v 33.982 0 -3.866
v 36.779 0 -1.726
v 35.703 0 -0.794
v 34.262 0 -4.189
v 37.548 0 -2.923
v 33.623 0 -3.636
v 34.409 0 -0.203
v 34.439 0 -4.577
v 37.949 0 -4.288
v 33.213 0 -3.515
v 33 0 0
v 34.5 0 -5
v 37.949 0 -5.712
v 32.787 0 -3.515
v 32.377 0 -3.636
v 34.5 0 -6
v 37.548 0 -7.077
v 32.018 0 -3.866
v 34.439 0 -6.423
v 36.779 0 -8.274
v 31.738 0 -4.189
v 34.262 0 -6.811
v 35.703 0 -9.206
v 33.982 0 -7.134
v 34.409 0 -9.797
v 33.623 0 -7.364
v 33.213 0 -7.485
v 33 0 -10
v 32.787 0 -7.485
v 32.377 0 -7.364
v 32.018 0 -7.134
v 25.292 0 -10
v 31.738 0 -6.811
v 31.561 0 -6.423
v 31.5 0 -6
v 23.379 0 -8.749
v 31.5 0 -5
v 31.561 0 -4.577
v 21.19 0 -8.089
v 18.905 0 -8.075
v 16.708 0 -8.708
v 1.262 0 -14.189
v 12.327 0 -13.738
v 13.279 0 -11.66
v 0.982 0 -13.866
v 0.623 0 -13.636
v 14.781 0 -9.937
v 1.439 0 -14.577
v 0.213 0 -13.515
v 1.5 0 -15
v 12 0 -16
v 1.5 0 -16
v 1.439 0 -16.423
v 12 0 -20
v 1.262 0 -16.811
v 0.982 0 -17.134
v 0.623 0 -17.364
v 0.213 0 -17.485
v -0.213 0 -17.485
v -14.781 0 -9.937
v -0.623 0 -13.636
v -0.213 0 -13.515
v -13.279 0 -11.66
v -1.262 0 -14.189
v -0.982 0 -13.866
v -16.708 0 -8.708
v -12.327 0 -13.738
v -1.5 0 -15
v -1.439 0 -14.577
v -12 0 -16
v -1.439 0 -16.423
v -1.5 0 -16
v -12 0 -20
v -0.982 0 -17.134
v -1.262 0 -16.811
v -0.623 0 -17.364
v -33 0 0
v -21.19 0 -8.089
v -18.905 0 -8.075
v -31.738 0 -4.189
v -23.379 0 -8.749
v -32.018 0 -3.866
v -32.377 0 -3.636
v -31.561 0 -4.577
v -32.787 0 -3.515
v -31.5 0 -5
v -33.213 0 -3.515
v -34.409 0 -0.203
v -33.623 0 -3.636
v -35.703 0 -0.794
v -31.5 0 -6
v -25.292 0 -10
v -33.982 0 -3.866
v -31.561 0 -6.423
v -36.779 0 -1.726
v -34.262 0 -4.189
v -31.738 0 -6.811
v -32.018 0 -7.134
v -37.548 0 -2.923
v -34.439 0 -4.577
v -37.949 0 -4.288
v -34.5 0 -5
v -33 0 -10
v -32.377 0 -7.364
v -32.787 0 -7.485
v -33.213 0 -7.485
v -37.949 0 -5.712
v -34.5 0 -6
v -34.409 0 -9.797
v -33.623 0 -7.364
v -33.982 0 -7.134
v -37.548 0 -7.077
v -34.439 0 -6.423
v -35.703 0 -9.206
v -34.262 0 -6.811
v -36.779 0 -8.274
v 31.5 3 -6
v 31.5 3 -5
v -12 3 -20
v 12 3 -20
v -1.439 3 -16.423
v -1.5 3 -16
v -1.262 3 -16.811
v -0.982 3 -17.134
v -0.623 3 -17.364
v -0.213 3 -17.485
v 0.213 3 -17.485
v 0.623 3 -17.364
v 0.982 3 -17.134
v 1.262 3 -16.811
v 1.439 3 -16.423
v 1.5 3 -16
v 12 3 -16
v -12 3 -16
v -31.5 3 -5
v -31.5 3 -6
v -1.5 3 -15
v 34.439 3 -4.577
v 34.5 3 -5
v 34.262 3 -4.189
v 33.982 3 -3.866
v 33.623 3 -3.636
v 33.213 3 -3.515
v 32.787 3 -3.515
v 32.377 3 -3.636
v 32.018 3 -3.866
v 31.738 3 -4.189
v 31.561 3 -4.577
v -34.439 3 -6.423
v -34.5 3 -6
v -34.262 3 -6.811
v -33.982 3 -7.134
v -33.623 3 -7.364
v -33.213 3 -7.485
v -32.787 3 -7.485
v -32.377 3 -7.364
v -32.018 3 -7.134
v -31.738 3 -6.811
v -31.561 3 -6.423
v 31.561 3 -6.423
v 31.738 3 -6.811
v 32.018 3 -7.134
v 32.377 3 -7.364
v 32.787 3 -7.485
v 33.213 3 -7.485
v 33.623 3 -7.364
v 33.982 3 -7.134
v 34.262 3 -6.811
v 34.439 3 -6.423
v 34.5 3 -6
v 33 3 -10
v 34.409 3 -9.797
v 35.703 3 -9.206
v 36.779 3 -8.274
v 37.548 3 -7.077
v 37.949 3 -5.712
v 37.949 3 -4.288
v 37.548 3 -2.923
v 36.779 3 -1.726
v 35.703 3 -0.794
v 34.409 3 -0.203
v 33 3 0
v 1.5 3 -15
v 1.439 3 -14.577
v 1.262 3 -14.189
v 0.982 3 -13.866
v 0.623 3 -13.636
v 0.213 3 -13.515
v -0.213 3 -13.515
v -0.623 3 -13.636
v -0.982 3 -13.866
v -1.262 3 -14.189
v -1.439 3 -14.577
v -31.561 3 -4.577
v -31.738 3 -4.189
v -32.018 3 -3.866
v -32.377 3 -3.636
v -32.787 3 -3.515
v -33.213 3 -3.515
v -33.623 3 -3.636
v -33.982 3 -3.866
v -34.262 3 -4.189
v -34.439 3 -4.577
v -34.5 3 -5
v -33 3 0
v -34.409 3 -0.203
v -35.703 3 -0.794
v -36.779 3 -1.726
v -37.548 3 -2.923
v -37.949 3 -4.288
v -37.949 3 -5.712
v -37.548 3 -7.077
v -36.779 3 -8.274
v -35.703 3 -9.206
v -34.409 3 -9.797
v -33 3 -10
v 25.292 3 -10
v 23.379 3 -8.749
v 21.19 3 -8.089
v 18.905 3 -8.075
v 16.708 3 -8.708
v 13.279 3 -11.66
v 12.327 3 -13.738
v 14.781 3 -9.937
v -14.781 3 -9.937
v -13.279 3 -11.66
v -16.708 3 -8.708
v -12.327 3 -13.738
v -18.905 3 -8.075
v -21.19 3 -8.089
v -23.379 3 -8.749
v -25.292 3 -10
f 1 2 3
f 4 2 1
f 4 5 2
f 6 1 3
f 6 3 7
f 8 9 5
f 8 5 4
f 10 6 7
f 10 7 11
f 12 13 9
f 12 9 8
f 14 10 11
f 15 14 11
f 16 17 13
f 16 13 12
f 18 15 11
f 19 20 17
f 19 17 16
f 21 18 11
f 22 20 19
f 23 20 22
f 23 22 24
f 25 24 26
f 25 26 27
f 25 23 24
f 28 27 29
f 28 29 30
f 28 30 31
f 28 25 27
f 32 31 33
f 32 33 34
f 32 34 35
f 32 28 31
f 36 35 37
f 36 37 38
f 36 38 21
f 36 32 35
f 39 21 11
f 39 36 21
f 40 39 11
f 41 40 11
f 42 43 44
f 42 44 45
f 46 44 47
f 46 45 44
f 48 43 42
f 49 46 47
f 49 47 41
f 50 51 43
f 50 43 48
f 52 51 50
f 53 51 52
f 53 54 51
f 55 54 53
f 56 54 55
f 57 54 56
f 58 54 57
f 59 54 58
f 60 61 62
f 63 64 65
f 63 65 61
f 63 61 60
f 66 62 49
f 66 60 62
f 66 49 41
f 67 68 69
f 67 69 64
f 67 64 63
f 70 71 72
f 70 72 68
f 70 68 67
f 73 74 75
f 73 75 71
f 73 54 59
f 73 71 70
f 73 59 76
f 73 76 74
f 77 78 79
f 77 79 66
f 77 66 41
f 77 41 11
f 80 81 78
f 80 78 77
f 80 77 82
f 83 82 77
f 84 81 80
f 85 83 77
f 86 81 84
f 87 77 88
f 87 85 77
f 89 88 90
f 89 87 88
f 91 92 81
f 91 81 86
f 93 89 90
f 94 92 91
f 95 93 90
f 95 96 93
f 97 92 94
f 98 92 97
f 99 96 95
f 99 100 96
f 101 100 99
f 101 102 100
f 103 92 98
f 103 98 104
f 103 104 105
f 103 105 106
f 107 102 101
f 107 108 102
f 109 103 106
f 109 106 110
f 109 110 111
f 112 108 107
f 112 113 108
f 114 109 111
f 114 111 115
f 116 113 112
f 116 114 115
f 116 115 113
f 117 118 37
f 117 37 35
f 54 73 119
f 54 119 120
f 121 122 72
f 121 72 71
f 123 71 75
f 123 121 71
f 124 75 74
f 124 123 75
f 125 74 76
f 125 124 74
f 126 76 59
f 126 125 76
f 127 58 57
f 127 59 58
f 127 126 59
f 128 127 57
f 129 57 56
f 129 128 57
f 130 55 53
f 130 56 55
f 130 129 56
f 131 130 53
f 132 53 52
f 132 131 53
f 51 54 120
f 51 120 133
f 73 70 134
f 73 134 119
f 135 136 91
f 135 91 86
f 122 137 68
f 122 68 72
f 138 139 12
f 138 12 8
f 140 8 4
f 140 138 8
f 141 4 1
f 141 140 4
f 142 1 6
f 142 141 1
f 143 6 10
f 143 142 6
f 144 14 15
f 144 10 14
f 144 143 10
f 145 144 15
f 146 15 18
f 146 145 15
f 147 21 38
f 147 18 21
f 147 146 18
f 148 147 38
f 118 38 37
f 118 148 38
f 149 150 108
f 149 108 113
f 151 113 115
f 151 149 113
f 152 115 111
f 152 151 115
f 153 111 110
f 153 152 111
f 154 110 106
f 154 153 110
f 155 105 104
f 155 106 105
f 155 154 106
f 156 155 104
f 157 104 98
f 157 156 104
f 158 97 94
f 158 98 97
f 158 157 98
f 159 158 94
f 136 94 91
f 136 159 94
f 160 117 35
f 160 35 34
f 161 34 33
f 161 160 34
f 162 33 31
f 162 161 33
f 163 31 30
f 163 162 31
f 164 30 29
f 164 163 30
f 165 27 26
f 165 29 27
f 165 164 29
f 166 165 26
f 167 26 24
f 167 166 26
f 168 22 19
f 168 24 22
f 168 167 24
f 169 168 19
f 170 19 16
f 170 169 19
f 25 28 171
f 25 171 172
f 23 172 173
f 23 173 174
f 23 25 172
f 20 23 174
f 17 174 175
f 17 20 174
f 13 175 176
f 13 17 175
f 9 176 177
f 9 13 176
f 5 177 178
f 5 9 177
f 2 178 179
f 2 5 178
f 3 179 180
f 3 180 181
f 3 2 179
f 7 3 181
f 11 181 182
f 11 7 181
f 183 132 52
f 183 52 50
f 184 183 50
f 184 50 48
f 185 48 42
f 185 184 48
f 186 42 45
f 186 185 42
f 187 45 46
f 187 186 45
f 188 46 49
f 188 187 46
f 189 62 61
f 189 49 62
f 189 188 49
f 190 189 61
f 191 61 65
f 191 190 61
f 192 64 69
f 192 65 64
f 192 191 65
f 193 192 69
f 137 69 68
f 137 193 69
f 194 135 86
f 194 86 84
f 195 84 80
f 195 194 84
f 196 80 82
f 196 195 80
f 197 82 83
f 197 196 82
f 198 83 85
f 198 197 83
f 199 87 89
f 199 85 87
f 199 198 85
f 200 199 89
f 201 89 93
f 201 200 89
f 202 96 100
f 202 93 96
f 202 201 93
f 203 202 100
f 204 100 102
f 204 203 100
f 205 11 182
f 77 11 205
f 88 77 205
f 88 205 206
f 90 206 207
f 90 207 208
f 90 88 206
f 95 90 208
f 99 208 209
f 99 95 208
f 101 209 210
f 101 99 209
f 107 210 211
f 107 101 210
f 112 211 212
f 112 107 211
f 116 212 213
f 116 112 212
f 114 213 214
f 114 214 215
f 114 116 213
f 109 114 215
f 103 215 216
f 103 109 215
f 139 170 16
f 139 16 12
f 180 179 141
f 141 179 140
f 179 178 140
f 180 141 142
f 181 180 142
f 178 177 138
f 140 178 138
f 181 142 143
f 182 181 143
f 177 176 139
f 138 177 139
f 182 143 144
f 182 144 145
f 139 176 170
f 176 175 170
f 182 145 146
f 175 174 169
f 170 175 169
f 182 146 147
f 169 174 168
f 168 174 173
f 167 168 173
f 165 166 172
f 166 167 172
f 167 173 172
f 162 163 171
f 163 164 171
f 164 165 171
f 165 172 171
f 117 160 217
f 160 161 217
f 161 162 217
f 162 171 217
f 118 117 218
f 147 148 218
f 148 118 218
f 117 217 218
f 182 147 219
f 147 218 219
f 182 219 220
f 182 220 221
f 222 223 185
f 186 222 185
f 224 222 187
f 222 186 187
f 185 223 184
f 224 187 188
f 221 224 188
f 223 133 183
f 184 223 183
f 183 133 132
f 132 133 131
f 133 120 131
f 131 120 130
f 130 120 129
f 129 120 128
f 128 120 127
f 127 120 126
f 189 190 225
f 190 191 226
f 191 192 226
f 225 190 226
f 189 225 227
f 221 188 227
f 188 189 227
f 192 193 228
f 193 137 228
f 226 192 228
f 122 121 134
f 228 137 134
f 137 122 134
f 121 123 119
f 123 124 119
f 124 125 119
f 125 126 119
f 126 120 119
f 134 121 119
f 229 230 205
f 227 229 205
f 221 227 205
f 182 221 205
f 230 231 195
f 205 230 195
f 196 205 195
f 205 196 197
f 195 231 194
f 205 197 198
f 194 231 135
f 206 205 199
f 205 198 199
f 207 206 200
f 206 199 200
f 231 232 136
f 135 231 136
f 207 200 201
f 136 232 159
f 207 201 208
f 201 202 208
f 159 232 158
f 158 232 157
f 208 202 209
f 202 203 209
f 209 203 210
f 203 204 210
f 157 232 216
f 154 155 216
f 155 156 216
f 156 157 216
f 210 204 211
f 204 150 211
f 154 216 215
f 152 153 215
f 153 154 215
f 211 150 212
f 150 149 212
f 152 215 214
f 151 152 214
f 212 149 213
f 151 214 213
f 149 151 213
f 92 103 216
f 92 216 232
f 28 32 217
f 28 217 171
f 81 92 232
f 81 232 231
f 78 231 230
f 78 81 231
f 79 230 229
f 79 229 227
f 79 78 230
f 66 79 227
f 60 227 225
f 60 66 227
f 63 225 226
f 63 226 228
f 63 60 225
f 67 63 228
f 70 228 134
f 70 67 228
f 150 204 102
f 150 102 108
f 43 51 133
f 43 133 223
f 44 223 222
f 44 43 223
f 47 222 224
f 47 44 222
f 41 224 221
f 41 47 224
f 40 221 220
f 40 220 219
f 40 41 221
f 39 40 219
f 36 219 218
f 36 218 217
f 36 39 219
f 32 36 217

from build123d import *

# Parameters (mm, degrees)
BOSS_EXTRUDE1_DEPTH = 3
CUT_EXTRUDE1_DEPTH  = 44.0464865


with BuildPart() as part:
    # Sketch1 → Boss-Extrude1 (new body)
    with BuildSketch(Plane(origin=(0, 0, 0), x_dir=(1, 0, 0), z_dir=(0, 1, 0))):
        with BuildLine():
            Line((0, 0), (-33, 0))
            ThreePointArc((-33, 0), (-38, 5), (-33, 10))
            Line((-33, 10), (-25.291502622, 10))
            ThreePointArc((-25.291502622, 10), (-16.708497378, 8.708497378), (-12, 16))
            Line((-12, 16), (-12, 20))
            Line((-12, 20), (12, 20))
            Line((12, 20), (12, 16))
            ThreePointArc((12, 16), (16.708497378, 8.708497378), (25.291502622, 10))
            Line((25.291502622, 10), (33, 10))
            ThreePointArc((33, 10), (38, 5), (33, 0))
            Line((33, 0), (0, 0))
        make_face()
    extrude(amount=BOSS_EXTRUDE1_DEPTH)

    # Sketch2 → Cut-Extrude1 (cut, through all)
    with BuildSketch(Plane(origin=(0, 3, 0), x_dir=(1, 0, 0), z_dir=(0, 1, 0))):
        with BuildLine():
            Line((-34.5, 5), (-34.5, 6))
            ThreePointArc((-34.5, 6), (-33, 7.5), (-31.5, 6))
            Line((-31.5, 6), (-31.5, 5))
            ThreePointArc((-31.5, 5), (-33, 3.5), (-34.5, 5))
        make_face()
        with BuildLine():
            Line((31.5, 5), (31.5, 6))
            ThreePointArc((31.5, 6), (33, 7.5), (34.5, 6))
            Line((34.5, 6), (34.5, 5))
            ThreePointArc((34.5, 5), (33, 3.5), (31.5, 5))
        make_face()
        with BuildLine():
            Line((-1.5, 15), (-1.5, 16))
            ThreePointArc((-1.5, 16), (0, 17.5), (1.5, 16))
            Line((1.5, 16), (1.5, 15))
            ThreePointArc((1.5, 15), (0, 13.5), (-1.5, 15))
        make_face()
    extrude(amount=-CUT_EXTRUDE1_DEPTH, mode=Mode.SUBTRACT)


solid = part.part
